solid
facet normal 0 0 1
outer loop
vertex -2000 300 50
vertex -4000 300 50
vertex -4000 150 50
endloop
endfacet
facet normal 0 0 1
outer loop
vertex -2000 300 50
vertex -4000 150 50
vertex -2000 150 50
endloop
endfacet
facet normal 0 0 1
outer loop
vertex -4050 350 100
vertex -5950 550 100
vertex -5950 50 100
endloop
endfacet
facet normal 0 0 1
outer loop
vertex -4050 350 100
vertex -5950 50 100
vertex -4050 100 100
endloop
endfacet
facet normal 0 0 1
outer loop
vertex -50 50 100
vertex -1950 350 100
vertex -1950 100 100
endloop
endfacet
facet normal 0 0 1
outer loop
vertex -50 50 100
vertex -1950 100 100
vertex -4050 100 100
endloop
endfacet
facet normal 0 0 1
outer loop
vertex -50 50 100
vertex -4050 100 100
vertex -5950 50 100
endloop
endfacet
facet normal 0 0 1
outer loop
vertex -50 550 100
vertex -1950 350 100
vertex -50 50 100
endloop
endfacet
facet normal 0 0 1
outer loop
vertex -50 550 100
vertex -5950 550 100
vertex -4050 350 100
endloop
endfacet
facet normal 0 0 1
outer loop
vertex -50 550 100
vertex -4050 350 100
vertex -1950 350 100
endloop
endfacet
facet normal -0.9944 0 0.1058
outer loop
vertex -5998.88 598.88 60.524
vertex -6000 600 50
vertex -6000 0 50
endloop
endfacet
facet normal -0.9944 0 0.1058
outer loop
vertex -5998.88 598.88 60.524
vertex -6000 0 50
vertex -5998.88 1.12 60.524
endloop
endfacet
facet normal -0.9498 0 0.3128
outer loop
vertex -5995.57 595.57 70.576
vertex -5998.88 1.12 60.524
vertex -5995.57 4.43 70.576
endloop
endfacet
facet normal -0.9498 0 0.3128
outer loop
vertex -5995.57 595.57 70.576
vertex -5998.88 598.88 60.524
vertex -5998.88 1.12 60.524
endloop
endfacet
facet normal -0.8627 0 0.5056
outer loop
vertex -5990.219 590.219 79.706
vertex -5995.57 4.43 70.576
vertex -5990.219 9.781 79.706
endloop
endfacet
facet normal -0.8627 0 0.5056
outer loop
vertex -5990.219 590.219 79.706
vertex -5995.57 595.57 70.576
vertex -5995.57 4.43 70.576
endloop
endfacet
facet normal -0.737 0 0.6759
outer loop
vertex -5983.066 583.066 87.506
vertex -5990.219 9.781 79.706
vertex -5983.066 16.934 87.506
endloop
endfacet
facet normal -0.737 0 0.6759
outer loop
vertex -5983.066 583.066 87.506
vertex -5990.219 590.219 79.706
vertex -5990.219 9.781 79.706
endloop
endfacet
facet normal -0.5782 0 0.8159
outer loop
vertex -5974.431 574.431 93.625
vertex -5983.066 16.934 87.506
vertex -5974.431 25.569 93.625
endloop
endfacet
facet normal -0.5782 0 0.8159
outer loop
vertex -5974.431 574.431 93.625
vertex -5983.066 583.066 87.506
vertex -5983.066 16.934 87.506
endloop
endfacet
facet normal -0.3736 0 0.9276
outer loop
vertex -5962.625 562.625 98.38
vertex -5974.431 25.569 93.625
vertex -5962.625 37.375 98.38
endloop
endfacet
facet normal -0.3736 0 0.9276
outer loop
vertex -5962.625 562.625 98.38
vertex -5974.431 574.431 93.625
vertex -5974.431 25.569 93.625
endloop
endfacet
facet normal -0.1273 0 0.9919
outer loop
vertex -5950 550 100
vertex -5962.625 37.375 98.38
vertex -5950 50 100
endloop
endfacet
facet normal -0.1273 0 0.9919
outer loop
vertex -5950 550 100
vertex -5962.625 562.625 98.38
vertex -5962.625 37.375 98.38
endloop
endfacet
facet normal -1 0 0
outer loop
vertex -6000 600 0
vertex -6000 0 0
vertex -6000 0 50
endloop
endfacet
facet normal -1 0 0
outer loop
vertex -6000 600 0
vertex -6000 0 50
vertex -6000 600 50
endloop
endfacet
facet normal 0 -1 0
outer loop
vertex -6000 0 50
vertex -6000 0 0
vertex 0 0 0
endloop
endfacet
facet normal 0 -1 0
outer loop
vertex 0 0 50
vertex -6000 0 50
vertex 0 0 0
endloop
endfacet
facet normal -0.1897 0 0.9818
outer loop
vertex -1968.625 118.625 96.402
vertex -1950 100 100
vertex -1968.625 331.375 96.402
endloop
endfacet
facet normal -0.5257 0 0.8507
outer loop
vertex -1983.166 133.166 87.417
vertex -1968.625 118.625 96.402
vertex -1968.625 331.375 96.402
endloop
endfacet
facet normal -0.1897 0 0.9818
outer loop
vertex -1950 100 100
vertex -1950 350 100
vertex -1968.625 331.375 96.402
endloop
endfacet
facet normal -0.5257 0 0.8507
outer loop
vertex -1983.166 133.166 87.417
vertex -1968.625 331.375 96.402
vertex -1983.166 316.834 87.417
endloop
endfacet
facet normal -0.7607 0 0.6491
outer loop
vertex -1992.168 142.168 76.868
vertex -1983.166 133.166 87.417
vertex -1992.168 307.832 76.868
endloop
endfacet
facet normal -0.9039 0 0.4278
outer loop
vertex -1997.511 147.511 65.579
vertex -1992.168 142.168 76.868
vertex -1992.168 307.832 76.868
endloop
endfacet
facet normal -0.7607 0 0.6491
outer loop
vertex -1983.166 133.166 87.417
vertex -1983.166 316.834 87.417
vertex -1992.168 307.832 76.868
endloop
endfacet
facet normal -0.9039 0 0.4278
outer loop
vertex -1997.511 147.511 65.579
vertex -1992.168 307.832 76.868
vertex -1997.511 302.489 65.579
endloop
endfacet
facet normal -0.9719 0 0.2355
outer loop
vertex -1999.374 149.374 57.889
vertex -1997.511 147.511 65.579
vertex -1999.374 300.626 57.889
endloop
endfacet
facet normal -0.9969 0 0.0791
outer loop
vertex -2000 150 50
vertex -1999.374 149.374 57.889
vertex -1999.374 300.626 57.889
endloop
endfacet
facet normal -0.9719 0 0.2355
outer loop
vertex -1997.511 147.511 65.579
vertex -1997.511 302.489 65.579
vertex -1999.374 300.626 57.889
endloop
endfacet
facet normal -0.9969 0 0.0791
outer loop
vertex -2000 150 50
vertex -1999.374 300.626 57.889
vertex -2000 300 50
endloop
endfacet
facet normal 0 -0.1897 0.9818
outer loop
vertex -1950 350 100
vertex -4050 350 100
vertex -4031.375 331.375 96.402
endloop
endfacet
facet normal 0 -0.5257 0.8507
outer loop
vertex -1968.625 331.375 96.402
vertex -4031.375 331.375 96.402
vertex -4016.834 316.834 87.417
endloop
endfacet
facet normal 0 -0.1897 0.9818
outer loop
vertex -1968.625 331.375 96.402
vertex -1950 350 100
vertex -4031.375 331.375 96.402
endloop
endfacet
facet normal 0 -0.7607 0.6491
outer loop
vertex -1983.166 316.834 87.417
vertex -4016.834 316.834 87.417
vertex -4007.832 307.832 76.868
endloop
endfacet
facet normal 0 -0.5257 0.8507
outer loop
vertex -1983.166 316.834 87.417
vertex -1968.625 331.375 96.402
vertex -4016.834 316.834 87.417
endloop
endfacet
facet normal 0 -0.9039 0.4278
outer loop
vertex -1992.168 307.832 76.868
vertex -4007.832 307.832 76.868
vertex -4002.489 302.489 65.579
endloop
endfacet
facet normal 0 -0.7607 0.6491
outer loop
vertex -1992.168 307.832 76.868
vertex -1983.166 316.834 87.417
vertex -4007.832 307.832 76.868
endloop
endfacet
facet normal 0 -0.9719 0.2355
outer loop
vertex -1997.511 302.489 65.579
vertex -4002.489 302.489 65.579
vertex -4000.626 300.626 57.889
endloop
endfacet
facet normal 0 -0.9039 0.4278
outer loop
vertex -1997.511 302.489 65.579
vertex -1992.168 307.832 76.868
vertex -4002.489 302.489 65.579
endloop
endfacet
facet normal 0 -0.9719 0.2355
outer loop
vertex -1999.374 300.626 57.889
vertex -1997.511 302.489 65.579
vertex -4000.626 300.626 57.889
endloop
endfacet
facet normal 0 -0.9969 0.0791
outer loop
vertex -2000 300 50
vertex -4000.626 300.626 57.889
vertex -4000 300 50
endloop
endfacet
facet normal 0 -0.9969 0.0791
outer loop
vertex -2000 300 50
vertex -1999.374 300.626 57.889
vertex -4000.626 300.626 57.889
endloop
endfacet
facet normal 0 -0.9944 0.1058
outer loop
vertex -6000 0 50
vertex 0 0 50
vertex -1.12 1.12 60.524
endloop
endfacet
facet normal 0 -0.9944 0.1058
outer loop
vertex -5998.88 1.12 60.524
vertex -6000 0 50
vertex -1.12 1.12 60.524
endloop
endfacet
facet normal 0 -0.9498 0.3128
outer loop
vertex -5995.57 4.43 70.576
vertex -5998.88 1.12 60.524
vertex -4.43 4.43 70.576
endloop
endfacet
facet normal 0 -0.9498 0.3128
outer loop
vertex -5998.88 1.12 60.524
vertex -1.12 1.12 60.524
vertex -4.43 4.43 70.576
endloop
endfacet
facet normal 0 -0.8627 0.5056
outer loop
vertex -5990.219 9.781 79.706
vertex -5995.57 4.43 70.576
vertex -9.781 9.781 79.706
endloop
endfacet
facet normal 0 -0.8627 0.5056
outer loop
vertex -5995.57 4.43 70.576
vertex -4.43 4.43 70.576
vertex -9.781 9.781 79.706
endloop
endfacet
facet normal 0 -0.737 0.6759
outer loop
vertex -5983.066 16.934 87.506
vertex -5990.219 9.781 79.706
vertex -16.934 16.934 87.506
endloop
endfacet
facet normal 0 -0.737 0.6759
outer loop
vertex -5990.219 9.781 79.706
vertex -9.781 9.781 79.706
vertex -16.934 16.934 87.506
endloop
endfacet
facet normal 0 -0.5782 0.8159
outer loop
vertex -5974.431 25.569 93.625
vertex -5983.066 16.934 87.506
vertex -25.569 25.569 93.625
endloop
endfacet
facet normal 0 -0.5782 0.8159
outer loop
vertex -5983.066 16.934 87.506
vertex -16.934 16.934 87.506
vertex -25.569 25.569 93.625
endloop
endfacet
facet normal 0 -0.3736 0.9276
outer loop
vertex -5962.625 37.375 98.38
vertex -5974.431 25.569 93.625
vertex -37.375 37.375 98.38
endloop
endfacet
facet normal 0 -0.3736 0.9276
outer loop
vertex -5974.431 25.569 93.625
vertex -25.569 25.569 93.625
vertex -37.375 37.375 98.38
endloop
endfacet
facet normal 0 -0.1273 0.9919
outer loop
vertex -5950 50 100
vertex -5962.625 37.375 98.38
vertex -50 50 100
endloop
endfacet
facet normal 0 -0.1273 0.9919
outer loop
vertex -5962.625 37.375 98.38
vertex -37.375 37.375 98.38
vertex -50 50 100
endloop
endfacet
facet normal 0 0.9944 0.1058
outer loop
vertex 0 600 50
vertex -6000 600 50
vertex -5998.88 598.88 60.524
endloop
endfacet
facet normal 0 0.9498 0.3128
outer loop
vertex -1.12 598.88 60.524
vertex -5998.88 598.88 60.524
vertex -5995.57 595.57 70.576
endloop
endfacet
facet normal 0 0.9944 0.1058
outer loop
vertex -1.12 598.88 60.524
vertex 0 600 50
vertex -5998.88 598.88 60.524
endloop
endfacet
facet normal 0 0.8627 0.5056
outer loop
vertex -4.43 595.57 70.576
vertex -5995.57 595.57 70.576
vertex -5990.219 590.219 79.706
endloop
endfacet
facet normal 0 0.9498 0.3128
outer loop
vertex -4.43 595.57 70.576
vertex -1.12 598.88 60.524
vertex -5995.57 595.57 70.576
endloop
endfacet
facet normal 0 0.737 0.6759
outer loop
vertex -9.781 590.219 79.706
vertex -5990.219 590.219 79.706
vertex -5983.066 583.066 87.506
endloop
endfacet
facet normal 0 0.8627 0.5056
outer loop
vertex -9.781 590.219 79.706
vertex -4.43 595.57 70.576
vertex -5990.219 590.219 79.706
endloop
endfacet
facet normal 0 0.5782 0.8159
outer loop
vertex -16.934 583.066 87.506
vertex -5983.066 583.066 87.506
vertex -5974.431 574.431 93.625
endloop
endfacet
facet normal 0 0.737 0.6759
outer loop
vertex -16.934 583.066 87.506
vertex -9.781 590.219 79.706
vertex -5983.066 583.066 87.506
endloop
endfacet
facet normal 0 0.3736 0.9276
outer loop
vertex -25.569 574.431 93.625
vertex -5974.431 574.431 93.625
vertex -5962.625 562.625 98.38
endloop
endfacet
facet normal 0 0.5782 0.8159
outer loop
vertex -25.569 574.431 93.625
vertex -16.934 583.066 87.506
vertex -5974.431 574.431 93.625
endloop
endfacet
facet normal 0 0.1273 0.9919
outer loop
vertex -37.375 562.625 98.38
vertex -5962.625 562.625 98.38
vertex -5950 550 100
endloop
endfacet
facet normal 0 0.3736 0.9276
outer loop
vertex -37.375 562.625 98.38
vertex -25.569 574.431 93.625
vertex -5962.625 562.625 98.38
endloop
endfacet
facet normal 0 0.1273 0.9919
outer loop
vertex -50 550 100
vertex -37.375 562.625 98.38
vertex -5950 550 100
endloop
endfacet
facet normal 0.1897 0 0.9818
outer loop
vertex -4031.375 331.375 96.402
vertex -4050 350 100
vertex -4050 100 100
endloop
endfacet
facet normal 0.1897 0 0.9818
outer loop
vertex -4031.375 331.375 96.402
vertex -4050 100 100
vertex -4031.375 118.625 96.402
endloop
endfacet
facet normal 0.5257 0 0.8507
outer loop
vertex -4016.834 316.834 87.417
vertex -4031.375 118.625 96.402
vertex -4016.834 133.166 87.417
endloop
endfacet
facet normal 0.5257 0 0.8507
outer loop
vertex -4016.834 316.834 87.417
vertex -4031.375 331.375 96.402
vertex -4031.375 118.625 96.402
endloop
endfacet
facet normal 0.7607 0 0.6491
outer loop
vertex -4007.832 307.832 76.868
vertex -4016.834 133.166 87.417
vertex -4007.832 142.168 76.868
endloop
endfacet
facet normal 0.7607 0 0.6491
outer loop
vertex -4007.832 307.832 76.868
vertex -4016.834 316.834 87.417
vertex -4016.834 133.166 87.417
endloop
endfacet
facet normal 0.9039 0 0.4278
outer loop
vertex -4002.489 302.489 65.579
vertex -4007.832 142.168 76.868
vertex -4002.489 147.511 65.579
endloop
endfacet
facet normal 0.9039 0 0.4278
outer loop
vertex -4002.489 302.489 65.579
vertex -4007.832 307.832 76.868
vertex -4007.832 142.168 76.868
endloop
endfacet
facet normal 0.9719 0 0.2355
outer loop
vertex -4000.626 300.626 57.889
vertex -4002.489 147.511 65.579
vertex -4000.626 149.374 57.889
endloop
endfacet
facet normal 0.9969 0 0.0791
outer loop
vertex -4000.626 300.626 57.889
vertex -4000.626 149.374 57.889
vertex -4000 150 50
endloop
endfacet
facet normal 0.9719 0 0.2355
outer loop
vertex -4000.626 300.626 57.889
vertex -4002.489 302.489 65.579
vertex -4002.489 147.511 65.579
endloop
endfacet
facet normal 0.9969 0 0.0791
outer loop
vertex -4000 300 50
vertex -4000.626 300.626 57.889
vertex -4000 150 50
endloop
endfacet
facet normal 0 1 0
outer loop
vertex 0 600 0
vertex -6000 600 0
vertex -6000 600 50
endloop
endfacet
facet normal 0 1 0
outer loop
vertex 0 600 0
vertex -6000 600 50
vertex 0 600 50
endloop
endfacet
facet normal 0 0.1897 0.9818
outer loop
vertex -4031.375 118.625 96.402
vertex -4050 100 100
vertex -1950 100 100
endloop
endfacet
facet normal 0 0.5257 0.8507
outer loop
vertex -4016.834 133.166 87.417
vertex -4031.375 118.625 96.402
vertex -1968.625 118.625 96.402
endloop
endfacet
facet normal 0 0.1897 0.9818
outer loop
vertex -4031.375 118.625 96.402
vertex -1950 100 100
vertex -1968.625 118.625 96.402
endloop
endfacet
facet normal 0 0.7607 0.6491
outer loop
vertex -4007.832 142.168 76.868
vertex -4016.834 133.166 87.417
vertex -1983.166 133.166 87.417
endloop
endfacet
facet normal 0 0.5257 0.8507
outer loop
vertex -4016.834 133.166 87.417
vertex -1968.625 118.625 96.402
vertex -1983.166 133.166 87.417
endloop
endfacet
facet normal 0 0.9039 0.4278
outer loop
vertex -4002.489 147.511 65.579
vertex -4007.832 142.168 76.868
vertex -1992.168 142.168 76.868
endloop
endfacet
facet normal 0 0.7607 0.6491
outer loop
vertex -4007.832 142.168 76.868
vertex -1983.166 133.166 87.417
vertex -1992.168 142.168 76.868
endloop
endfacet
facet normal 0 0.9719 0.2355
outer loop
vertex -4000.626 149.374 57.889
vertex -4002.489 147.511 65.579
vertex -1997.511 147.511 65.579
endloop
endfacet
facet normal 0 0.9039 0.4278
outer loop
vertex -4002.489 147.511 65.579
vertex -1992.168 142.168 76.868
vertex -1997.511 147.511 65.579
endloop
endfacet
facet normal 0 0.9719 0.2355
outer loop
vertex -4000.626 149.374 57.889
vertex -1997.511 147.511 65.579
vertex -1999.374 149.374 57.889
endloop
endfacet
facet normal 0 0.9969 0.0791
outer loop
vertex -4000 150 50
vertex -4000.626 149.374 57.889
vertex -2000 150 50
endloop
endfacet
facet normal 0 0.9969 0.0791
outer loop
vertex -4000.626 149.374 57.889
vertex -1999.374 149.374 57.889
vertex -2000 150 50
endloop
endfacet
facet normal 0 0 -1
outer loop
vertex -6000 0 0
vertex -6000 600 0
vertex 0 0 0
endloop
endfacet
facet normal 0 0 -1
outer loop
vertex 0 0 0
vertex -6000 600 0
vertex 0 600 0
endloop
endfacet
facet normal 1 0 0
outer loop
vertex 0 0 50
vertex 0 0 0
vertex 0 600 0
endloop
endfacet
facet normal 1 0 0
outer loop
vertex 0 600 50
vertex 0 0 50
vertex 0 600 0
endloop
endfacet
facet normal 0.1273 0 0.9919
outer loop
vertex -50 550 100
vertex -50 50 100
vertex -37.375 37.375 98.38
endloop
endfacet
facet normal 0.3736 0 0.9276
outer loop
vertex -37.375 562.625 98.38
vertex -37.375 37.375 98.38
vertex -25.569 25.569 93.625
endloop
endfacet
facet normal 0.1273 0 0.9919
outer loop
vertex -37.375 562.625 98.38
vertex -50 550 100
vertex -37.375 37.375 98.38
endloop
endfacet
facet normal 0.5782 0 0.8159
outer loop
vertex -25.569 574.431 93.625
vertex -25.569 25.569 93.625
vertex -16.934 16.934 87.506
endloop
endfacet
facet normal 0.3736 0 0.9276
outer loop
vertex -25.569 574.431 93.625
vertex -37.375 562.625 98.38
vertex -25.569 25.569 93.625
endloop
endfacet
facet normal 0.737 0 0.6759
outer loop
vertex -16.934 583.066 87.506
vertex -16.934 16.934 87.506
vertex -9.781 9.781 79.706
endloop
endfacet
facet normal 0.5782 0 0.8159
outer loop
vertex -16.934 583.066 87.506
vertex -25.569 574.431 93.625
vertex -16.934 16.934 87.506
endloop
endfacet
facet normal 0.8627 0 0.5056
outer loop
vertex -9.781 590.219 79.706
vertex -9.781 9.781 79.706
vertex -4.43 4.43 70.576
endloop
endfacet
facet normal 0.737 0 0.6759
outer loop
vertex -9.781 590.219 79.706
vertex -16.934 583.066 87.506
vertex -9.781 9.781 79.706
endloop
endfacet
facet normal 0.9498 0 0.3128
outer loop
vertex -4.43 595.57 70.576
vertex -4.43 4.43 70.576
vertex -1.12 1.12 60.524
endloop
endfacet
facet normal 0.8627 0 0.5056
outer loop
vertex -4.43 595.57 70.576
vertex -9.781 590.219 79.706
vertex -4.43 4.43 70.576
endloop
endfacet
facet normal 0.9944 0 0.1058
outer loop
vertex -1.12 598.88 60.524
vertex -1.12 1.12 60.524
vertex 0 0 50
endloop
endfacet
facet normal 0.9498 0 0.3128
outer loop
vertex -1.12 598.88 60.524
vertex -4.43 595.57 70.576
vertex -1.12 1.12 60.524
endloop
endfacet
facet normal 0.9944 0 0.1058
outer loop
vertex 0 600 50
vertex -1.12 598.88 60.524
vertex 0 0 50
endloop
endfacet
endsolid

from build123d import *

# Parameters (mm, degrees)
SKETCH1_W           = 6000
SKETCH1_H           = 600
BOSS_EXTRUDE1_DEPTH = 100
SKETCH2_W           = 2000
SKETCH2_H           = 150
CUT_EXTRUDE1_DEPTH  = 50
FILLET2_R           = 50


with BuildPart() as part:
    # Sketch1 → Boss-Extrude1 (new body)
    with BuildSketch(Plane.XY):
        with Locations((-3000, 300)):
            Rectangle(SKETCH1_W, SKETCH1_H)
    extrude(amount=BOSS_EXTRUDE1_DEPTH)

    # Sketch2 → Cut-Extrude1 (cut)
    with BuildSketch(Plane.XY.offset(100)):
        with Locations((-3000, 225)):
            Rectangle(SKETCH2_W, SKETCH2_H)
    extrude(amount=-CUT_EXTRUDE1_DEPTH, mode=Mode.SUBTRACT)

    # Fillet2
    fillet2_edges = [part.edges().sort_by_distance(p)[0] for p in [
        (-3000, 0, 100),
        (-6000, 300, 100),
        (-3000, 600, 100),
        (0, 300, 100),
        (-3000, 300, 100),
        (-4000, 225, 100),
        (-3000, 150, 100),
        (-2000, 225, 100),
    ]]
    fillet(fillet2_edges, radius=FILLET2_R - 0.0001)  # a hair under: the kernel refuses the full size


solid = part.part
